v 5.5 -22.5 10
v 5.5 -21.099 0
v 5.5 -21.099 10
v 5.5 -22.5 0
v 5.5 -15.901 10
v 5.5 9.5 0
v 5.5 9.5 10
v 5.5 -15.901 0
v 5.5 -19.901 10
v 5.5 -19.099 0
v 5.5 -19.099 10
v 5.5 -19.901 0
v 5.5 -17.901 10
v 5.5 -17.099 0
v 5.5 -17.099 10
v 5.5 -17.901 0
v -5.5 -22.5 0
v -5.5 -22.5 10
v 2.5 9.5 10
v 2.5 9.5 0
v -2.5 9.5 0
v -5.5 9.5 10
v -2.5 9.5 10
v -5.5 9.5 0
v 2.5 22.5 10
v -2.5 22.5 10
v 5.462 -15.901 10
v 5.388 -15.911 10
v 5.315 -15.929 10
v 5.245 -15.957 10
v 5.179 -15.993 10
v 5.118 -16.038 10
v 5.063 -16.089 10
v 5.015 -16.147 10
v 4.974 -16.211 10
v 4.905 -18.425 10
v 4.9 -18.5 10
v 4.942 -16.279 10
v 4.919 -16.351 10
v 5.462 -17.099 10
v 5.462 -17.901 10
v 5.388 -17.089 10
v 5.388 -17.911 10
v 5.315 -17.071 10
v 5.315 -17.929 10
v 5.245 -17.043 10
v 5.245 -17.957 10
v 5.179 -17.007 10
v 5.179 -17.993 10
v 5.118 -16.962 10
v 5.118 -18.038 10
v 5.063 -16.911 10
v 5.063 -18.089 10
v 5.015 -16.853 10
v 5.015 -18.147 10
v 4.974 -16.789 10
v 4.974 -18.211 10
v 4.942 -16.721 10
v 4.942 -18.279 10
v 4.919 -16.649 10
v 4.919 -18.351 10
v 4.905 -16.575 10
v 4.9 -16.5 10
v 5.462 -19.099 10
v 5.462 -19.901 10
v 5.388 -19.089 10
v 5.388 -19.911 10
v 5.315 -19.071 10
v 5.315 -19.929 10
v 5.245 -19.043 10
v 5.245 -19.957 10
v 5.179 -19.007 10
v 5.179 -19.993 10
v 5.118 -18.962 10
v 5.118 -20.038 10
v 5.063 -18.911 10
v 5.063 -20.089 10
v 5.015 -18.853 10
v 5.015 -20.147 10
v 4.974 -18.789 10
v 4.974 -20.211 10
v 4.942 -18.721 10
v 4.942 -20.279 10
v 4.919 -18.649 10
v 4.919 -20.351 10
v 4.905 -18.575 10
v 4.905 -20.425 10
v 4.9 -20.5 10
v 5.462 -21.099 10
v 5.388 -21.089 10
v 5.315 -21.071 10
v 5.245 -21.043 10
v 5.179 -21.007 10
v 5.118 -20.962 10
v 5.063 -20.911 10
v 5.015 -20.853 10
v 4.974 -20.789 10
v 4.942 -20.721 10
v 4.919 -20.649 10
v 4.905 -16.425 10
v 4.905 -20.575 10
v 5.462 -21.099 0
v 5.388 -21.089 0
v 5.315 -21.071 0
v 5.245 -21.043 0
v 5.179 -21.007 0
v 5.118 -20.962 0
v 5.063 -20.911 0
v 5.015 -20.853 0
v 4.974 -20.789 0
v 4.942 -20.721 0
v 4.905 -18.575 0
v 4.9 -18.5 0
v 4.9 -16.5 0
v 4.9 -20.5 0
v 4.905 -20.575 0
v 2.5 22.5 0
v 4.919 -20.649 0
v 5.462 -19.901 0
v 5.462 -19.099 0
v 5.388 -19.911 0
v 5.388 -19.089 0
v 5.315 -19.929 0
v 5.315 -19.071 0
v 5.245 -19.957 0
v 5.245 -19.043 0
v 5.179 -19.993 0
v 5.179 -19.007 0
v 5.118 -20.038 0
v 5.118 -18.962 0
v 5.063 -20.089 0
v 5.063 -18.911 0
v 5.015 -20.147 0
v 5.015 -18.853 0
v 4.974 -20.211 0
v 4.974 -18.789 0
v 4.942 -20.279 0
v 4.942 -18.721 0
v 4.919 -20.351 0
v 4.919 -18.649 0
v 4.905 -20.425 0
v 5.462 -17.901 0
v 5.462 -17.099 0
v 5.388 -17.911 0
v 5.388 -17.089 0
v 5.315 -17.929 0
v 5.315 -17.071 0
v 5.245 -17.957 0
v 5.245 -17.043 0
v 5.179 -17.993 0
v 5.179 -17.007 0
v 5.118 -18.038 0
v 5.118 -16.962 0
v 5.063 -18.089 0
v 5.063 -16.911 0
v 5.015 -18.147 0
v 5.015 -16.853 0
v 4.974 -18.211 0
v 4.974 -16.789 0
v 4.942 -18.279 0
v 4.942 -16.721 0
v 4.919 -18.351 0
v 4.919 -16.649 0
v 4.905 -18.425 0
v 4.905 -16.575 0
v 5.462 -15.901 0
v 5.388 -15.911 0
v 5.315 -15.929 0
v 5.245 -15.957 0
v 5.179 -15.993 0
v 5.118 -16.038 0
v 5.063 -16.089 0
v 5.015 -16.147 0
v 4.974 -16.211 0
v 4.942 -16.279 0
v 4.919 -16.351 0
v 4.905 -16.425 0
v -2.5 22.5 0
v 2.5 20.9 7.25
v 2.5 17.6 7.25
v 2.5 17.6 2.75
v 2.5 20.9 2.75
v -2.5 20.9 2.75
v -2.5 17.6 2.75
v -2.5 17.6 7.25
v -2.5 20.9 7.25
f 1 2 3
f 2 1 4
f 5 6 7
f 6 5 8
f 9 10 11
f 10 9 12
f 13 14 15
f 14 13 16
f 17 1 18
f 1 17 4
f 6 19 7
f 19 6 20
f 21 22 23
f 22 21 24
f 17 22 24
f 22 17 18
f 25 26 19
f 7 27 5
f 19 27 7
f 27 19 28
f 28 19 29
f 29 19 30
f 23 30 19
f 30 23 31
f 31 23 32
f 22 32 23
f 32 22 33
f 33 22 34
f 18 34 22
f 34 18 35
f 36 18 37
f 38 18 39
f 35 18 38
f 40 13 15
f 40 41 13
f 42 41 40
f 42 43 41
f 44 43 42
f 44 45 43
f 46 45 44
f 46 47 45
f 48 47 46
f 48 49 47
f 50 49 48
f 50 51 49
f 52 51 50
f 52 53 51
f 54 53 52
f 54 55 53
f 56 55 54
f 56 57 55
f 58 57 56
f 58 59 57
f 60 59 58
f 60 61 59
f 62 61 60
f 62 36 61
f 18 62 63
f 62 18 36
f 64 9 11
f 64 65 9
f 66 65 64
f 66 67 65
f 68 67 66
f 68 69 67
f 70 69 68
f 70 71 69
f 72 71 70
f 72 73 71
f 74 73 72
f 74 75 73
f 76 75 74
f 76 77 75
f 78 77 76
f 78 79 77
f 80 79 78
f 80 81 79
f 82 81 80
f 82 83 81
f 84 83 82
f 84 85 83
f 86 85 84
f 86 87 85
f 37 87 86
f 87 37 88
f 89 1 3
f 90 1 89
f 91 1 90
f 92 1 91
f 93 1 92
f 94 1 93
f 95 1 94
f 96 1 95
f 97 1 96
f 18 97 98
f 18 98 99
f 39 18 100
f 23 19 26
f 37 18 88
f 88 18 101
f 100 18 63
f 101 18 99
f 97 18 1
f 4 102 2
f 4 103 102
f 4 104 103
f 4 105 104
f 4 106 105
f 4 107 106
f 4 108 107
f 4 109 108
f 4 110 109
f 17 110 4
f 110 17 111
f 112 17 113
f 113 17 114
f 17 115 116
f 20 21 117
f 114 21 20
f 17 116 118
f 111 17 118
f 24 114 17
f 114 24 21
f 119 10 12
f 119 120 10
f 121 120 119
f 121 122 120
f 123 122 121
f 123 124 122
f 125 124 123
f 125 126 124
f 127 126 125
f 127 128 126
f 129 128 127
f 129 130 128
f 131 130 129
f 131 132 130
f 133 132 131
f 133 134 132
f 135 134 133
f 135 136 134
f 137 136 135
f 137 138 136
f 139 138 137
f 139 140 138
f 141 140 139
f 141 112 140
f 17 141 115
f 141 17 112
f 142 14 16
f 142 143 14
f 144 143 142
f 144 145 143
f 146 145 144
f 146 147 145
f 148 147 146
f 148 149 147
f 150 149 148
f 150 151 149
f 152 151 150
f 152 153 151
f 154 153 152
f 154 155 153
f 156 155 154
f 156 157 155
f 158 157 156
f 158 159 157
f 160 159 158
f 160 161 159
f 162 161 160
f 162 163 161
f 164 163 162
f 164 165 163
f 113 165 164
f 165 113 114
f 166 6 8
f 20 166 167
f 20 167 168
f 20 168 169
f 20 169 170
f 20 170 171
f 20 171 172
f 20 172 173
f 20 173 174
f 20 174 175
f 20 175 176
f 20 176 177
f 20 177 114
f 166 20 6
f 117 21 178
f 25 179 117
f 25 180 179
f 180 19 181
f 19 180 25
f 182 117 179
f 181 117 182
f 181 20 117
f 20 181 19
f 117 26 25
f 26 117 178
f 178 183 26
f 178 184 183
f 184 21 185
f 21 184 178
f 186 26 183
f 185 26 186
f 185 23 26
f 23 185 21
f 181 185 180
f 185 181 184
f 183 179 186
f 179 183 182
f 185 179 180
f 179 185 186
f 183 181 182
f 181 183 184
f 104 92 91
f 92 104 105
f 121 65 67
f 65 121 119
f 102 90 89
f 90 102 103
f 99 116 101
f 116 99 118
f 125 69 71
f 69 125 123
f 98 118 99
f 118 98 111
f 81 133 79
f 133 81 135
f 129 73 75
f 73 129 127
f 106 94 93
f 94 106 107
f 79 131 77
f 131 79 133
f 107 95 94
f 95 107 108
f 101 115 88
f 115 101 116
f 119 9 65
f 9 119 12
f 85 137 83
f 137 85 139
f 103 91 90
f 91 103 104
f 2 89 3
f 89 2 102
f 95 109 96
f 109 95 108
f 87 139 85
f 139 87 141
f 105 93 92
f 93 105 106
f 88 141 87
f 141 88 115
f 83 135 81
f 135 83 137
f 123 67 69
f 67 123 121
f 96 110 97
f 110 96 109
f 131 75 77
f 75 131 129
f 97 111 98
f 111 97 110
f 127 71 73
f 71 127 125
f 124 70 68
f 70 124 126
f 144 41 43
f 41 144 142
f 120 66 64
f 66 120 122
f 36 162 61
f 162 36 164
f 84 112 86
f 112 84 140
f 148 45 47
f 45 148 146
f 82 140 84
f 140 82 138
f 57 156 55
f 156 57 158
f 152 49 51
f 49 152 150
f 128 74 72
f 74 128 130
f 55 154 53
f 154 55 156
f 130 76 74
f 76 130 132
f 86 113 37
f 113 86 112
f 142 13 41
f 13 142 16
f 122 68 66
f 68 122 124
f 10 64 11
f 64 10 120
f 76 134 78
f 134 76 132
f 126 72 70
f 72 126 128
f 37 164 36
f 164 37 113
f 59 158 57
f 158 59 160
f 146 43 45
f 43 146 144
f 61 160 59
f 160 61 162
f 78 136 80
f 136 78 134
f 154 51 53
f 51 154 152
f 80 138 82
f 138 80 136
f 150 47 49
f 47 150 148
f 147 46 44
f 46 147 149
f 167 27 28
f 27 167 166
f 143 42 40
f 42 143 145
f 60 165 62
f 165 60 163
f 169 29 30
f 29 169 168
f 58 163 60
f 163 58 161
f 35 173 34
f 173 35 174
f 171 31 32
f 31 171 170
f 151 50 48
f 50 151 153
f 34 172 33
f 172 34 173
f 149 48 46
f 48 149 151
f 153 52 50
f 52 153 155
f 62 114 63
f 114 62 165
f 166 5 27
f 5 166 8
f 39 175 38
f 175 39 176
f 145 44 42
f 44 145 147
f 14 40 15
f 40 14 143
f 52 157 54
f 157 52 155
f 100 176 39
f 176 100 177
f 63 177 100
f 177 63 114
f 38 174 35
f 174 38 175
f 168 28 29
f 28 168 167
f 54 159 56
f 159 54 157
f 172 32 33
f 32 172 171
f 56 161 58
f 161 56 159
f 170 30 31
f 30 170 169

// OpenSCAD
$fn = 50;

difference() {
	union() {
		translate(v = [0, 9.5, 0]) {
			rotate(a = [90, 0, 0]) {
				difference() {
					union() {
						translate(v = [-5.5, 0, 0]) {
							cube(size = [11.0, 10.0, 32.0]);
						}
						translate(v = [-2.5, 0, -13.0]) {
							cube(size = [5.0, 10.0, 13.1]);
						}
					}
					union() {
						translate(v = [-2.6, 2.75, -11.4]) {
							cube(size = [5.2, 4.5, 3.3]);
						}
						translate(v = [5.5, 10.1, 30.0]) {
							rotate(a = [90, 0, 0]) {
								cylinder(h = 10.2, r = 0.6);
							}
						}
						translate(v = [5.5, 10.1, 28.0]) {
							rotate(a = [90, 0, 0]) {
								cylinder(h = 10.2, r = 0.6);
							}
						}
						translate(v = [5.5, 10.1, 26.0]) {
							rotate(a = [90, 0, 0]) {
								cylinder(h = 10.2, r = 0.6);
							}
						}
					}
				}
			}
		}
	}
	union();
}
